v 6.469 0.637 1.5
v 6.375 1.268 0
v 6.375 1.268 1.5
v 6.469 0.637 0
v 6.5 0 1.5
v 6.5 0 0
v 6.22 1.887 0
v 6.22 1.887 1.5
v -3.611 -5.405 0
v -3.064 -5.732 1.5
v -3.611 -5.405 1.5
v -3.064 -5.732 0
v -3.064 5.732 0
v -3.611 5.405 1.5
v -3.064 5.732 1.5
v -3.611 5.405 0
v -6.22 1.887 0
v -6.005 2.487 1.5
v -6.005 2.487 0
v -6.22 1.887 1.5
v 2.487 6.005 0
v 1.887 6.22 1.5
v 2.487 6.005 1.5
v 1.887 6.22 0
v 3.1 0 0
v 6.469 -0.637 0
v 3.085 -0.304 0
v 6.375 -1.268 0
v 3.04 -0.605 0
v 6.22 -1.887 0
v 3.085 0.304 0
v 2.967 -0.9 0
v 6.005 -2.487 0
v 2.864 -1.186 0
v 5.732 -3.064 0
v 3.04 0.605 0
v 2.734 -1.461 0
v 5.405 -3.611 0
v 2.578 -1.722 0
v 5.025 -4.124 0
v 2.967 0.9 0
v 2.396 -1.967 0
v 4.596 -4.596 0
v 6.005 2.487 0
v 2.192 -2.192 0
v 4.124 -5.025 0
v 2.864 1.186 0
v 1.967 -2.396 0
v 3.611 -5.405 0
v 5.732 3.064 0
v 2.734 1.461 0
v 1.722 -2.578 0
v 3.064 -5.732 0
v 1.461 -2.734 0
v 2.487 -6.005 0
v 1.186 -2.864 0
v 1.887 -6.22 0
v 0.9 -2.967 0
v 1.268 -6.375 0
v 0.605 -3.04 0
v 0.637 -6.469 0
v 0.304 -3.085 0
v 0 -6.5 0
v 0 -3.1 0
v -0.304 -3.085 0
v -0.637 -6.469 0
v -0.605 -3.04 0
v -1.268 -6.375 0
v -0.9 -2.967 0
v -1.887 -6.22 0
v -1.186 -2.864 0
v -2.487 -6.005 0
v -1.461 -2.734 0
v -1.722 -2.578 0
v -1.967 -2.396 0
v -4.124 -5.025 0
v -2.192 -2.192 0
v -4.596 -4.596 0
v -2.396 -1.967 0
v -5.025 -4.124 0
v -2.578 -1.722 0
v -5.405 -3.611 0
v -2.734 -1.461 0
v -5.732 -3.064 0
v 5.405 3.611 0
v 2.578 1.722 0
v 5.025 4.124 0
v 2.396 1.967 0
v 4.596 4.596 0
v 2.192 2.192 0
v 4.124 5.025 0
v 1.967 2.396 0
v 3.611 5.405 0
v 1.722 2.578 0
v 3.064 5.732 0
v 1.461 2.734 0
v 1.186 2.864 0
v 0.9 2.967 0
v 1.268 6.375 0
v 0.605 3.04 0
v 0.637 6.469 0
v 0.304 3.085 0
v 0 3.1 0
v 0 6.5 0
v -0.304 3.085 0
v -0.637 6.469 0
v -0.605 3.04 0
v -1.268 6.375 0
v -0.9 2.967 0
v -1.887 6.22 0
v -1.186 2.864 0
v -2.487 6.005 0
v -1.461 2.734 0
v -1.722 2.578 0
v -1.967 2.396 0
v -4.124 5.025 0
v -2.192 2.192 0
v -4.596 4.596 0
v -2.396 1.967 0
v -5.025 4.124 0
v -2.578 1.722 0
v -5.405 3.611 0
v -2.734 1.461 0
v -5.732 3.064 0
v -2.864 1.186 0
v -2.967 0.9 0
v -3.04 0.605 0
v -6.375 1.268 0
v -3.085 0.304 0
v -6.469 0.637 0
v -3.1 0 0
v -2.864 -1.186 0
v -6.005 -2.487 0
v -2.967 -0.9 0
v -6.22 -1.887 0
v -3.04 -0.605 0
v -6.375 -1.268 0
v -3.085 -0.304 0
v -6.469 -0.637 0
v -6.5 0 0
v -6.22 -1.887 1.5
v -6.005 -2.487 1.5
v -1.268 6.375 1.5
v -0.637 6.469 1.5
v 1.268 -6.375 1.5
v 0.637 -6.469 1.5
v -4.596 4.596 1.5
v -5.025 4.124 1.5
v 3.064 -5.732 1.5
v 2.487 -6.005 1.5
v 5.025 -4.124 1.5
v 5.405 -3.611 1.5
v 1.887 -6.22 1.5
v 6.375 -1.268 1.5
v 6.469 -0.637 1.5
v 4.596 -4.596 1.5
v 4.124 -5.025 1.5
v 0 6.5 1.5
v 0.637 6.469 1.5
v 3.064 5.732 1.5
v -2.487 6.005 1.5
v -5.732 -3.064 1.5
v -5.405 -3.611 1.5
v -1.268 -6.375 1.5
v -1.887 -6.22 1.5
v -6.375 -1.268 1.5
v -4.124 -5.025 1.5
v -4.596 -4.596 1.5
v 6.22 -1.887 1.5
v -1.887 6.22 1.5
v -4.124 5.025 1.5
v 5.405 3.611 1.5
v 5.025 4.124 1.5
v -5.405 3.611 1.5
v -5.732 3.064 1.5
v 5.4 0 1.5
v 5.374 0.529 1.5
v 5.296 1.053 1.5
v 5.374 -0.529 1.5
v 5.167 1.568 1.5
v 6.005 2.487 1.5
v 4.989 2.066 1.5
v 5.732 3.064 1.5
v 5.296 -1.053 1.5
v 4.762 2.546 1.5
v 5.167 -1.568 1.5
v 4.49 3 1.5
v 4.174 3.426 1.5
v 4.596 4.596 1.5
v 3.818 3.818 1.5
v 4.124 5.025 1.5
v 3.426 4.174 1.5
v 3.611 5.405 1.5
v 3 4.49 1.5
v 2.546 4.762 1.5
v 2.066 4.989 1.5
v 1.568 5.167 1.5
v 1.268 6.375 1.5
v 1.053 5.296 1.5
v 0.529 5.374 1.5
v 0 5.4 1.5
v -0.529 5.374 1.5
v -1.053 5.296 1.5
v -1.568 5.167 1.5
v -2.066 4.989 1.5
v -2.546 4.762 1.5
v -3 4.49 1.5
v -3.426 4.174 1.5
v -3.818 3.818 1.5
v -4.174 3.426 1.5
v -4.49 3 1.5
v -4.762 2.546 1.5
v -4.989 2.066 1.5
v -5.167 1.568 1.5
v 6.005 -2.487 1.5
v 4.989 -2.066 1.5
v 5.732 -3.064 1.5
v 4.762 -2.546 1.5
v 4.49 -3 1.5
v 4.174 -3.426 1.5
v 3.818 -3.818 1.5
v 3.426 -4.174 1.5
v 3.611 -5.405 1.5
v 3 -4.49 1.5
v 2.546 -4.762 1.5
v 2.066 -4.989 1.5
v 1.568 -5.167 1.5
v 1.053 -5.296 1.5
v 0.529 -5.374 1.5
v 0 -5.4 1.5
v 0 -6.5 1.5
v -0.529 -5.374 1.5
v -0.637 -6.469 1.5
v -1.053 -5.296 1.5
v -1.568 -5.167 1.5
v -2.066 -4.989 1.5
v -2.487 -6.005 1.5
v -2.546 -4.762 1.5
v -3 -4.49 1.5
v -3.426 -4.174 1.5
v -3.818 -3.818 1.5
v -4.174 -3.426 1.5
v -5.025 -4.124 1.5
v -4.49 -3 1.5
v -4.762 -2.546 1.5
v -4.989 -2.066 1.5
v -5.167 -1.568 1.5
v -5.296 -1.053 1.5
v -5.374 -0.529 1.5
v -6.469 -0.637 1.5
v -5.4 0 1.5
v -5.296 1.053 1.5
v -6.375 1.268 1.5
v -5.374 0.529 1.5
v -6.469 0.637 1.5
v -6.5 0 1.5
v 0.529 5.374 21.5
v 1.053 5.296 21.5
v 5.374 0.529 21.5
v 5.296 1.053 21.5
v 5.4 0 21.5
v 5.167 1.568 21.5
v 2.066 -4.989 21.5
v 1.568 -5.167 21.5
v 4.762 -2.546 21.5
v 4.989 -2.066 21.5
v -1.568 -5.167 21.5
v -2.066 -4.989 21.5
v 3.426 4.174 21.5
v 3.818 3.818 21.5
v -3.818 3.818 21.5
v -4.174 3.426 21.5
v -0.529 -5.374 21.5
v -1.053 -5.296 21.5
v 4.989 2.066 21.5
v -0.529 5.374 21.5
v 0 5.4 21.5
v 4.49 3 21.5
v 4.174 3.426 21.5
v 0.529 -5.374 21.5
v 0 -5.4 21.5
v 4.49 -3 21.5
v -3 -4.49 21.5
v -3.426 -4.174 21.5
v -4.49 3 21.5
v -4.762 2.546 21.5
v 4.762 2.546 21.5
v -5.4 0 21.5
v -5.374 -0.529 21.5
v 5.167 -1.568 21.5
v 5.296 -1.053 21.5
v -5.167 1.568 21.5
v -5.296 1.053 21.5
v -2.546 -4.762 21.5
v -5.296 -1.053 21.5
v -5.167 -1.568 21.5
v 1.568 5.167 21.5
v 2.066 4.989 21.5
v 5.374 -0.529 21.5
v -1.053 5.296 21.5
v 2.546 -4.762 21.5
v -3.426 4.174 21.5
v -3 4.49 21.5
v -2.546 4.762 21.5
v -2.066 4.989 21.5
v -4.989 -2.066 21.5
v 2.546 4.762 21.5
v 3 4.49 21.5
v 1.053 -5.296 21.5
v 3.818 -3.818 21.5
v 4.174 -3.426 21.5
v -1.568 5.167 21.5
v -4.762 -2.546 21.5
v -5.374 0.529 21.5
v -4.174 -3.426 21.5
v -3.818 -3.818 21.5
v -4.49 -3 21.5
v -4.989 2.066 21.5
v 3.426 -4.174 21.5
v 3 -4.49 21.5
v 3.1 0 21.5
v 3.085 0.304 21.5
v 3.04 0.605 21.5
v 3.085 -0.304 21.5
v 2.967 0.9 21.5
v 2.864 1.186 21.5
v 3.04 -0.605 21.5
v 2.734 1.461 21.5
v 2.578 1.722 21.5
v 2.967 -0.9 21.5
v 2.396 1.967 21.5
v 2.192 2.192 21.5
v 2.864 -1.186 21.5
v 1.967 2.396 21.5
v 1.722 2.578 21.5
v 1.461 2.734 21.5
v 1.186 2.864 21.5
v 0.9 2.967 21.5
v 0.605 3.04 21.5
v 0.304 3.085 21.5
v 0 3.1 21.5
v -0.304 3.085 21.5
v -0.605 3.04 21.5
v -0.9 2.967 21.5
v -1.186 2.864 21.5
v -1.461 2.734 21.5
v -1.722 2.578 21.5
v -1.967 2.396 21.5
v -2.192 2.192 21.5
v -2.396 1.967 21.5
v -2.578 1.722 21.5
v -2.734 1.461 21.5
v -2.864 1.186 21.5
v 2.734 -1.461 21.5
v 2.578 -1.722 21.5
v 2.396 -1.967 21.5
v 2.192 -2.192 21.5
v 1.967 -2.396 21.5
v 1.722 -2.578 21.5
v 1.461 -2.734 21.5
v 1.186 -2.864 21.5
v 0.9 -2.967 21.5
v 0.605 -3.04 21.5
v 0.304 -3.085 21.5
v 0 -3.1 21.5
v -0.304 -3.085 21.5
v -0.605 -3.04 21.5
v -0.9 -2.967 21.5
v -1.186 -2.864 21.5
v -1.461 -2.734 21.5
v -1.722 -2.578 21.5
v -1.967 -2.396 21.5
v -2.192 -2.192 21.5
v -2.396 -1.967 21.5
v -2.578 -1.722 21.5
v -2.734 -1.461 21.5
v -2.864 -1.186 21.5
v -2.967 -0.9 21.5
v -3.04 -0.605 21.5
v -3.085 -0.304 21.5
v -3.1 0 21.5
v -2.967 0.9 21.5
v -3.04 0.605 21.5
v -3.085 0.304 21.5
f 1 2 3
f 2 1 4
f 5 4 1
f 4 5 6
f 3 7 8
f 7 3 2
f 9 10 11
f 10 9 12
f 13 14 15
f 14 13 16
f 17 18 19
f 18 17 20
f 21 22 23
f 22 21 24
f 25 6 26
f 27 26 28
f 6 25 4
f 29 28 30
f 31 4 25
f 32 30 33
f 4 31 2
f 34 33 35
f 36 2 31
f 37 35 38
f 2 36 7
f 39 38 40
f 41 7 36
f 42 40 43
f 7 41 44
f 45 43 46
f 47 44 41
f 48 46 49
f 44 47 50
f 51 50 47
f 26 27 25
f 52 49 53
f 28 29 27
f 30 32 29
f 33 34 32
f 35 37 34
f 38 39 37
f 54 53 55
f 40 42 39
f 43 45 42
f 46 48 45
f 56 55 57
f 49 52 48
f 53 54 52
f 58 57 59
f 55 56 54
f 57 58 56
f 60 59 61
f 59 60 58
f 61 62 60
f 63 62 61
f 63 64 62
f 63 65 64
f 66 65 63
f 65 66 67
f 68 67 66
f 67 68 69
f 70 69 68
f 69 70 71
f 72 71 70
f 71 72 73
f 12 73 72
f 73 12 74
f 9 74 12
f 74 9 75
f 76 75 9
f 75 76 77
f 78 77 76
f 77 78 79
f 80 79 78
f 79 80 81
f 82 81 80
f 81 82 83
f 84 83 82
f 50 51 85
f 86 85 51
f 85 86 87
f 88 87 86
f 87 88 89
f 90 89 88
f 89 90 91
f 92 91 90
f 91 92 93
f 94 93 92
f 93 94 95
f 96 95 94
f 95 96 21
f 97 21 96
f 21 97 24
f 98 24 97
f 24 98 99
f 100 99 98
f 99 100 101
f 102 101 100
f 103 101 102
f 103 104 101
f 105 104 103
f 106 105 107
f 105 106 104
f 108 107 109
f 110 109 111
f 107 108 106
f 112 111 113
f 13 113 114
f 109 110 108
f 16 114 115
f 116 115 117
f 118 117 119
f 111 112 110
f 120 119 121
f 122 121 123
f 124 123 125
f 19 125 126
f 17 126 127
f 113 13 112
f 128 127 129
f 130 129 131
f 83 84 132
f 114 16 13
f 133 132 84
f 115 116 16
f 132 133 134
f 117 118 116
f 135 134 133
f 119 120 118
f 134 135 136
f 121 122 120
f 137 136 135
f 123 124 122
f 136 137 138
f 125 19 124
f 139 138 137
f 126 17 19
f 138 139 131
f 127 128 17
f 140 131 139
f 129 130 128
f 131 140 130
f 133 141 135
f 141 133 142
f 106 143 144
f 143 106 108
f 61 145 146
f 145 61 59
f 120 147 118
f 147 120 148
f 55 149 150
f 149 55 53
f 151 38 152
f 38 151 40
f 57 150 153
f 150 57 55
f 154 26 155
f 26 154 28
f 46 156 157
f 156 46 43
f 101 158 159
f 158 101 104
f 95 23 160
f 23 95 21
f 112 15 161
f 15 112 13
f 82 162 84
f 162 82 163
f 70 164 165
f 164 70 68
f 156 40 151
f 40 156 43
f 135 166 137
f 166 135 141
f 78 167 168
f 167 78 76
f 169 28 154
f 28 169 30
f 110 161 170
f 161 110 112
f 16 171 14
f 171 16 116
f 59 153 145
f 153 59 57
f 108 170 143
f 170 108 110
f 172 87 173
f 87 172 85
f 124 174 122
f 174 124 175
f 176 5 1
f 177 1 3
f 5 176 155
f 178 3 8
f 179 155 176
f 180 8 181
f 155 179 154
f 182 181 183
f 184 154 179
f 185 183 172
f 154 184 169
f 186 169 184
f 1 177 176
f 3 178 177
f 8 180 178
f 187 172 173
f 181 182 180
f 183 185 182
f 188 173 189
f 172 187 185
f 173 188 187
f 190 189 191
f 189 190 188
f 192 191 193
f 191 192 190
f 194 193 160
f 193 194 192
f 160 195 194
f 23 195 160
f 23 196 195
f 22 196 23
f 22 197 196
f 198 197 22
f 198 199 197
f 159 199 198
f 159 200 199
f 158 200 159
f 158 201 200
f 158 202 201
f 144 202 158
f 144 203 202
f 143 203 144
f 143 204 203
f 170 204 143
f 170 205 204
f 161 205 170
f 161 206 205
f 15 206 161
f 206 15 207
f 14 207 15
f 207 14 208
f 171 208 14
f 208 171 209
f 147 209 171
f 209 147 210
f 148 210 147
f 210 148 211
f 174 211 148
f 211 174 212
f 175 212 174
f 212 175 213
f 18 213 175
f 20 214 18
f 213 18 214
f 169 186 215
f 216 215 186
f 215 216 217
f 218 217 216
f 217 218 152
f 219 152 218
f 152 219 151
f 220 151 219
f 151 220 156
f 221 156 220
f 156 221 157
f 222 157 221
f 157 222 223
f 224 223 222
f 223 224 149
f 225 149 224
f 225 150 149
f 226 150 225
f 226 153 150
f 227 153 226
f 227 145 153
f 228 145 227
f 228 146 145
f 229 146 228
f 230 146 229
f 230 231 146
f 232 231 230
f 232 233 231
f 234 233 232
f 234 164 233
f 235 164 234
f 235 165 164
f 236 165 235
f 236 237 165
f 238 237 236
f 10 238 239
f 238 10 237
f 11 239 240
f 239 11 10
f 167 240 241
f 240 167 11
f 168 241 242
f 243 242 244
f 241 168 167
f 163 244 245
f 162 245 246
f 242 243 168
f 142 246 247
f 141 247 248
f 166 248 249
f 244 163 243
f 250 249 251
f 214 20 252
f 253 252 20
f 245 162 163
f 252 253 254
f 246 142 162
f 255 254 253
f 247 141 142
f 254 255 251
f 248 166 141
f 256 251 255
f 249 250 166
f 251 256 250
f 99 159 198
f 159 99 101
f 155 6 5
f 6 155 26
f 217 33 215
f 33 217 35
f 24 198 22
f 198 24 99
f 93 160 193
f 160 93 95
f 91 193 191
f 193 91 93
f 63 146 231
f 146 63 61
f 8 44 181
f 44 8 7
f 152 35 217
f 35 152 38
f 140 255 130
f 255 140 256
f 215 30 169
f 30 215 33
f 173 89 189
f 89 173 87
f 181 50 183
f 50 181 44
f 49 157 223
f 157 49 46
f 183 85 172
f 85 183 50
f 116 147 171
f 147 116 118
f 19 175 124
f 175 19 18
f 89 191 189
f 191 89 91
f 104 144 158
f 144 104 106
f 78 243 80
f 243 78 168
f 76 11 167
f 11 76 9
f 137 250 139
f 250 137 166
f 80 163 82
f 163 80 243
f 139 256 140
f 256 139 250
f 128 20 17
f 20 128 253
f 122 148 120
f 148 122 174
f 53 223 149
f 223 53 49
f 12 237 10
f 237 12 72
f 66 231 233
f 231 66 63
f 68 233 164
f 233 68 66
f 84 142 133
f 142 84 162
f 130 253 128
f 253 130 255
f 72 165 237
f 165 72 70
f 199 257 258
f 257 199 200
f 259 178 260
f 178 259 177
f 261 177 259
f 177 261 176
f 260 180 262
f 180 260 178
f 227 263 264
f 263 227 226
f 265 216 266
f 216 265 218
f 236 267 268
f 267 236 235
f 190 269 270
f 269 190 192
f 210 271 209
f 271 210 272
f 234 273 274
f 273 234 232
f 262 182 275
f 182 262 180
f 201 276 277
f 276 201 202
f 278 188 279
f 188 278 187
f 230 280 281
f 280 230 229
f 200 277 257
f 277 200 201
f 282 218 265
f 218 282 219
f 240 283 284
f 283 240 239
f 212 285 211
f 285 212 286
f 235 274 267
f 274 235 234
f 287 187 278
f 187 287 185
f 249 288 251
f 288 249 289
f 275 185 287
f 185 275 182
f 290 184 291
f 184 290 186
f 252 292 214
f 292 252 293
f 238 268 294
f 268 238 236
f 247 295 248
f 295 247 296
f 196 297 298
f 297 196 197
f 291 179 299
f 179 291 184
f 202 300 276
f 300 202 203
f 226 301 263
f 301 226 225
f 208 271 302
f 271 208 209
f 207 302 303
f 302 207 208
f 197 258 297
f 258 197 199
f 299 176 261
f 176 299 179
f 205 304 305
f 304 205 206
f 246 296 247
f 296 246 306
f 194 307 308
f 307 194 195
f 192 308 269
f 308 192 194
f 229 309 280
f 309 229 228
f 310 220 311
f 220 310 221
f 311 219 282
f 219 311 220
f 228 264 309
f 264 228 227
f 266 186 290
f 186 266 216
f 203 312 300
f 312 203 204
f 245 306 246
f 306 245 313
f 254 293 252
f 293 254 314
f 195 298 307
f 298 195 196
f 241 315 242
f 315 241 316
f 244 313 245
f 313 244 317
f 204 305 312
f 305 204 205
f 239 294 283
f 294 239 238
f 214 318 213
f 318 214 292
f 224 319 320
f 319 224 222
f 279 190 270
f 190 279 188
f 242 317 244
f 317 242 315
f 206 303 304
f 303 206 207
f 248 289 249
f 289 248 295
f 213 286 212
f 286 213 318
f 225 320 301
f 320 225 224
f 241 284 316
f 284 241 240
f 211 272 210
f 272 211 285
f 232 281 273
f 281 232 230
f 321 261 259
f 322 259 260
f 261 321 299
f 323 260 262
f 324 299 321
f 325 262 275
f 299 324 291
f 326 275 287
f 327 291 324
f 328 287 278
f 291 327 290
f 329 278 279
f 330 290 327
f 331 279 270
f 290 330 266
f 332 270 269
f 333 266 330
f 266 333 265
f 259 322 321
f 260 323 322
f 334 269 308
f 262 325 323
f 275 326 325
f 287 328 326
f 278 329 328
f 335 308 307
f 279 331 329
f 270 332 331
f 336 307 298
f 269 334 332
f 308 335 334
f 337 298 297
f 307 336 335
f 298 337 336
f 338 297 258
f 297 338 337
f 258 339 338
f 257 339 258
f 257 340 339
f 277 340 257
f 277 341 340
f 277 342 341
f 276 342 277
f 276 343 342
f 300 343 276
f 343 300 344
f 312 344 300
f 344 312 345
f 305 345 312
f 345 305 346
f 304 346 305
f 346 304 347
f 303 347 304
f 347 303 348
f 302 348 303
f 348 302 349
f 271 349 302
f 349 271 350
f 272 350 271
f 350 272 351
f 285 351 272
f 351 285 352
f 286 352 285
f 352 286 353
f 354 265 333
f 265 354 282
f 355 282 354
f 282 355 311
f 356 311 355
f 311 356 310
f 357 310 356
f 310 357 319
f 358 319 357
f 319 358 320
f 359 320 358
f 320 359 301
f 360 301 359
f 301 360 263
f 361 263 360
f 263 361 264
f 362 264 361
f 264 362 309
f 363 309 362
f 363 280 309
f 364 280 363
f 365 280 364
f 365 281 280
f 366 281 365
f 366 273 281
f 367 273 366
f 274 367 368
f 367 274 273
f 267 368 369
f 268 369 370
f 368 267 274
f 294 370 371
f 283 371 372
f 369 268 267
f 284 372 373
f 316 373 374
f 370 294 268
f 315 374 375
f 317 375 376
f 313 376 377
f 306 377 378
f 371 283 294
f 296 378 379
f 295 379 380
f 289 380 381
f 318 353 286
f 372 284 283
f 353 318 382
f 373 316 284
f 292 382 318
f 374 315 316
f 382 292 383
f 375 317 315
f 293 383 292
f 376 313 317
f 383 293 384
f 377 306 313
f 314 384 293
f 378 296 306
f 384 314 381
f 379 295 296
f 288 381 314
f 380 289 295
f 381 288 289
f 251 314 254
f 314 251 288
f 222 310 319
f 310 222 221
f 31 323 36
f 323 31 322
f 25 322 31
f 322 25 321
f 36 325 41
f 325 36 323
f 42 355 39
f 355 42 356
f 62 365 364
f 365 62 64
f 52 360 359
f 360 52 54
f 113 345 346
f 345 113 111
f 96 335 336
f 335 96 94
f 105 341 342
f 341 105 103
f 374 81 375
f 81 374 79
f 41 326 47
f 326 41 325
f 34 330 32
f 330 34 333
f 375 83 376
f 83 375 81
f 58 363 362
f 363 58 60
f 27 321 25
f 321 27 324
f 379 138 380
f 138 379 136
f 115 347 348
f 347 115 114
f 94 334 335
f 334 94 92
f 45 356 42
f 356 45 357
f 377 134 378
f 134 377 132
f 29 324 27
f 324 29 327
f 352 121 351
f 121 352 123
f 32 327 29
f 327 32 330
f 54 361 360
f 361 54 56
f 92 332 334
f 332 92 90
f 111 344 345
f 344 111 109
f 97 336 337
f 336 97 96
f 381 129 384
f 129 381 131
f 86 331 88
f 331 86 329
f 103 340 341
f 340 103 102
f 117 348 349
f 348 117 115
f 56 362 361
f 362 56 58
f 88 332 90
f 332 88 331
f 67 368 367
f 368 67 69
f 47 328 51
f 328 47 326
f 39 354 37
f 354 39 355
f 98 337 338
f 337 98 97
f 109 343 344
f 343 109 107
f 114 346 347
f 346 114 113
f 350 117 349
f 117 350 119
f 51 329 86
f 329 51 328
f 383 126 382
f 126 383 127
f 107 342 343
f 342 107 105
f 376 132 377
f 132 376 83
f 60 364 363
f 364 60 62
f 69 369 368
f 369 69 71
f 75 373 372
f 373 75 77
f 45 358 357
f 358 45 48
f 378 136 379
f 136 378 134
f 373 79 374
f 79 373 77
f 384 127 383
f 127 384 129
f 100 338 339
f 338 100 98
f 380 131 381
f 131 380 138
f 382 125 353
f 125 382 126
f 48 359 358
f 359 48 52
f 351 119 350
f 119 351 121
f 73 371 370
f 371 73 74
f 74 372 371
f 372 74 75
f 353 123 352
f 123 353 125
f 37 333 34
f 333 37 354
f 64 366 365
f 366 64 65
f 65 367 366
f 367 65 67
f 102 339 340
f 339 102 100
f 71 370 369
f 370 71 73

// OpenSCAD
// PCR tube adapter sleeve - fits a 0.2 mL tube into a 1.5 mL rack hole
// Print orientation: collar on bed (z = 0), sleeve body rises to z = 21.5

$fn = 64;

// --- Dimensions (mm) ---
collar_d        = 13;     // collar outer diameter
collar_h        = 1.5;    // collar thickness (z = 0 to 1.5)
sleeve_od       = 10.8;   // sleeve body outer diameter
sleeve_h        = 20;     // sleeve body height above collar (z = 1.5 to 21.5)
bore_d          = 6.2;    // through-bore diameter
eps             = 0.5;    // cutter overshoot past faces

total_h = collar_h + sleeve_h; // 21.5 mm overall height

difference() {
    union() {
        // Collar
        cylinder(d = collar_d, h = collar_h);
        // Sleeve body (slightly overlapping collar for a clean union)
        translate([0, 0, collar_h - 0.01])
            cylinder(d = sleeve_od, h = sleeve_h + 0.01);
    }
    // Full-height bore, open at both ends
    translate([0, 0, -eps])
        cylinder(d = bore_d, h = total_h + 2 * eps);
}
